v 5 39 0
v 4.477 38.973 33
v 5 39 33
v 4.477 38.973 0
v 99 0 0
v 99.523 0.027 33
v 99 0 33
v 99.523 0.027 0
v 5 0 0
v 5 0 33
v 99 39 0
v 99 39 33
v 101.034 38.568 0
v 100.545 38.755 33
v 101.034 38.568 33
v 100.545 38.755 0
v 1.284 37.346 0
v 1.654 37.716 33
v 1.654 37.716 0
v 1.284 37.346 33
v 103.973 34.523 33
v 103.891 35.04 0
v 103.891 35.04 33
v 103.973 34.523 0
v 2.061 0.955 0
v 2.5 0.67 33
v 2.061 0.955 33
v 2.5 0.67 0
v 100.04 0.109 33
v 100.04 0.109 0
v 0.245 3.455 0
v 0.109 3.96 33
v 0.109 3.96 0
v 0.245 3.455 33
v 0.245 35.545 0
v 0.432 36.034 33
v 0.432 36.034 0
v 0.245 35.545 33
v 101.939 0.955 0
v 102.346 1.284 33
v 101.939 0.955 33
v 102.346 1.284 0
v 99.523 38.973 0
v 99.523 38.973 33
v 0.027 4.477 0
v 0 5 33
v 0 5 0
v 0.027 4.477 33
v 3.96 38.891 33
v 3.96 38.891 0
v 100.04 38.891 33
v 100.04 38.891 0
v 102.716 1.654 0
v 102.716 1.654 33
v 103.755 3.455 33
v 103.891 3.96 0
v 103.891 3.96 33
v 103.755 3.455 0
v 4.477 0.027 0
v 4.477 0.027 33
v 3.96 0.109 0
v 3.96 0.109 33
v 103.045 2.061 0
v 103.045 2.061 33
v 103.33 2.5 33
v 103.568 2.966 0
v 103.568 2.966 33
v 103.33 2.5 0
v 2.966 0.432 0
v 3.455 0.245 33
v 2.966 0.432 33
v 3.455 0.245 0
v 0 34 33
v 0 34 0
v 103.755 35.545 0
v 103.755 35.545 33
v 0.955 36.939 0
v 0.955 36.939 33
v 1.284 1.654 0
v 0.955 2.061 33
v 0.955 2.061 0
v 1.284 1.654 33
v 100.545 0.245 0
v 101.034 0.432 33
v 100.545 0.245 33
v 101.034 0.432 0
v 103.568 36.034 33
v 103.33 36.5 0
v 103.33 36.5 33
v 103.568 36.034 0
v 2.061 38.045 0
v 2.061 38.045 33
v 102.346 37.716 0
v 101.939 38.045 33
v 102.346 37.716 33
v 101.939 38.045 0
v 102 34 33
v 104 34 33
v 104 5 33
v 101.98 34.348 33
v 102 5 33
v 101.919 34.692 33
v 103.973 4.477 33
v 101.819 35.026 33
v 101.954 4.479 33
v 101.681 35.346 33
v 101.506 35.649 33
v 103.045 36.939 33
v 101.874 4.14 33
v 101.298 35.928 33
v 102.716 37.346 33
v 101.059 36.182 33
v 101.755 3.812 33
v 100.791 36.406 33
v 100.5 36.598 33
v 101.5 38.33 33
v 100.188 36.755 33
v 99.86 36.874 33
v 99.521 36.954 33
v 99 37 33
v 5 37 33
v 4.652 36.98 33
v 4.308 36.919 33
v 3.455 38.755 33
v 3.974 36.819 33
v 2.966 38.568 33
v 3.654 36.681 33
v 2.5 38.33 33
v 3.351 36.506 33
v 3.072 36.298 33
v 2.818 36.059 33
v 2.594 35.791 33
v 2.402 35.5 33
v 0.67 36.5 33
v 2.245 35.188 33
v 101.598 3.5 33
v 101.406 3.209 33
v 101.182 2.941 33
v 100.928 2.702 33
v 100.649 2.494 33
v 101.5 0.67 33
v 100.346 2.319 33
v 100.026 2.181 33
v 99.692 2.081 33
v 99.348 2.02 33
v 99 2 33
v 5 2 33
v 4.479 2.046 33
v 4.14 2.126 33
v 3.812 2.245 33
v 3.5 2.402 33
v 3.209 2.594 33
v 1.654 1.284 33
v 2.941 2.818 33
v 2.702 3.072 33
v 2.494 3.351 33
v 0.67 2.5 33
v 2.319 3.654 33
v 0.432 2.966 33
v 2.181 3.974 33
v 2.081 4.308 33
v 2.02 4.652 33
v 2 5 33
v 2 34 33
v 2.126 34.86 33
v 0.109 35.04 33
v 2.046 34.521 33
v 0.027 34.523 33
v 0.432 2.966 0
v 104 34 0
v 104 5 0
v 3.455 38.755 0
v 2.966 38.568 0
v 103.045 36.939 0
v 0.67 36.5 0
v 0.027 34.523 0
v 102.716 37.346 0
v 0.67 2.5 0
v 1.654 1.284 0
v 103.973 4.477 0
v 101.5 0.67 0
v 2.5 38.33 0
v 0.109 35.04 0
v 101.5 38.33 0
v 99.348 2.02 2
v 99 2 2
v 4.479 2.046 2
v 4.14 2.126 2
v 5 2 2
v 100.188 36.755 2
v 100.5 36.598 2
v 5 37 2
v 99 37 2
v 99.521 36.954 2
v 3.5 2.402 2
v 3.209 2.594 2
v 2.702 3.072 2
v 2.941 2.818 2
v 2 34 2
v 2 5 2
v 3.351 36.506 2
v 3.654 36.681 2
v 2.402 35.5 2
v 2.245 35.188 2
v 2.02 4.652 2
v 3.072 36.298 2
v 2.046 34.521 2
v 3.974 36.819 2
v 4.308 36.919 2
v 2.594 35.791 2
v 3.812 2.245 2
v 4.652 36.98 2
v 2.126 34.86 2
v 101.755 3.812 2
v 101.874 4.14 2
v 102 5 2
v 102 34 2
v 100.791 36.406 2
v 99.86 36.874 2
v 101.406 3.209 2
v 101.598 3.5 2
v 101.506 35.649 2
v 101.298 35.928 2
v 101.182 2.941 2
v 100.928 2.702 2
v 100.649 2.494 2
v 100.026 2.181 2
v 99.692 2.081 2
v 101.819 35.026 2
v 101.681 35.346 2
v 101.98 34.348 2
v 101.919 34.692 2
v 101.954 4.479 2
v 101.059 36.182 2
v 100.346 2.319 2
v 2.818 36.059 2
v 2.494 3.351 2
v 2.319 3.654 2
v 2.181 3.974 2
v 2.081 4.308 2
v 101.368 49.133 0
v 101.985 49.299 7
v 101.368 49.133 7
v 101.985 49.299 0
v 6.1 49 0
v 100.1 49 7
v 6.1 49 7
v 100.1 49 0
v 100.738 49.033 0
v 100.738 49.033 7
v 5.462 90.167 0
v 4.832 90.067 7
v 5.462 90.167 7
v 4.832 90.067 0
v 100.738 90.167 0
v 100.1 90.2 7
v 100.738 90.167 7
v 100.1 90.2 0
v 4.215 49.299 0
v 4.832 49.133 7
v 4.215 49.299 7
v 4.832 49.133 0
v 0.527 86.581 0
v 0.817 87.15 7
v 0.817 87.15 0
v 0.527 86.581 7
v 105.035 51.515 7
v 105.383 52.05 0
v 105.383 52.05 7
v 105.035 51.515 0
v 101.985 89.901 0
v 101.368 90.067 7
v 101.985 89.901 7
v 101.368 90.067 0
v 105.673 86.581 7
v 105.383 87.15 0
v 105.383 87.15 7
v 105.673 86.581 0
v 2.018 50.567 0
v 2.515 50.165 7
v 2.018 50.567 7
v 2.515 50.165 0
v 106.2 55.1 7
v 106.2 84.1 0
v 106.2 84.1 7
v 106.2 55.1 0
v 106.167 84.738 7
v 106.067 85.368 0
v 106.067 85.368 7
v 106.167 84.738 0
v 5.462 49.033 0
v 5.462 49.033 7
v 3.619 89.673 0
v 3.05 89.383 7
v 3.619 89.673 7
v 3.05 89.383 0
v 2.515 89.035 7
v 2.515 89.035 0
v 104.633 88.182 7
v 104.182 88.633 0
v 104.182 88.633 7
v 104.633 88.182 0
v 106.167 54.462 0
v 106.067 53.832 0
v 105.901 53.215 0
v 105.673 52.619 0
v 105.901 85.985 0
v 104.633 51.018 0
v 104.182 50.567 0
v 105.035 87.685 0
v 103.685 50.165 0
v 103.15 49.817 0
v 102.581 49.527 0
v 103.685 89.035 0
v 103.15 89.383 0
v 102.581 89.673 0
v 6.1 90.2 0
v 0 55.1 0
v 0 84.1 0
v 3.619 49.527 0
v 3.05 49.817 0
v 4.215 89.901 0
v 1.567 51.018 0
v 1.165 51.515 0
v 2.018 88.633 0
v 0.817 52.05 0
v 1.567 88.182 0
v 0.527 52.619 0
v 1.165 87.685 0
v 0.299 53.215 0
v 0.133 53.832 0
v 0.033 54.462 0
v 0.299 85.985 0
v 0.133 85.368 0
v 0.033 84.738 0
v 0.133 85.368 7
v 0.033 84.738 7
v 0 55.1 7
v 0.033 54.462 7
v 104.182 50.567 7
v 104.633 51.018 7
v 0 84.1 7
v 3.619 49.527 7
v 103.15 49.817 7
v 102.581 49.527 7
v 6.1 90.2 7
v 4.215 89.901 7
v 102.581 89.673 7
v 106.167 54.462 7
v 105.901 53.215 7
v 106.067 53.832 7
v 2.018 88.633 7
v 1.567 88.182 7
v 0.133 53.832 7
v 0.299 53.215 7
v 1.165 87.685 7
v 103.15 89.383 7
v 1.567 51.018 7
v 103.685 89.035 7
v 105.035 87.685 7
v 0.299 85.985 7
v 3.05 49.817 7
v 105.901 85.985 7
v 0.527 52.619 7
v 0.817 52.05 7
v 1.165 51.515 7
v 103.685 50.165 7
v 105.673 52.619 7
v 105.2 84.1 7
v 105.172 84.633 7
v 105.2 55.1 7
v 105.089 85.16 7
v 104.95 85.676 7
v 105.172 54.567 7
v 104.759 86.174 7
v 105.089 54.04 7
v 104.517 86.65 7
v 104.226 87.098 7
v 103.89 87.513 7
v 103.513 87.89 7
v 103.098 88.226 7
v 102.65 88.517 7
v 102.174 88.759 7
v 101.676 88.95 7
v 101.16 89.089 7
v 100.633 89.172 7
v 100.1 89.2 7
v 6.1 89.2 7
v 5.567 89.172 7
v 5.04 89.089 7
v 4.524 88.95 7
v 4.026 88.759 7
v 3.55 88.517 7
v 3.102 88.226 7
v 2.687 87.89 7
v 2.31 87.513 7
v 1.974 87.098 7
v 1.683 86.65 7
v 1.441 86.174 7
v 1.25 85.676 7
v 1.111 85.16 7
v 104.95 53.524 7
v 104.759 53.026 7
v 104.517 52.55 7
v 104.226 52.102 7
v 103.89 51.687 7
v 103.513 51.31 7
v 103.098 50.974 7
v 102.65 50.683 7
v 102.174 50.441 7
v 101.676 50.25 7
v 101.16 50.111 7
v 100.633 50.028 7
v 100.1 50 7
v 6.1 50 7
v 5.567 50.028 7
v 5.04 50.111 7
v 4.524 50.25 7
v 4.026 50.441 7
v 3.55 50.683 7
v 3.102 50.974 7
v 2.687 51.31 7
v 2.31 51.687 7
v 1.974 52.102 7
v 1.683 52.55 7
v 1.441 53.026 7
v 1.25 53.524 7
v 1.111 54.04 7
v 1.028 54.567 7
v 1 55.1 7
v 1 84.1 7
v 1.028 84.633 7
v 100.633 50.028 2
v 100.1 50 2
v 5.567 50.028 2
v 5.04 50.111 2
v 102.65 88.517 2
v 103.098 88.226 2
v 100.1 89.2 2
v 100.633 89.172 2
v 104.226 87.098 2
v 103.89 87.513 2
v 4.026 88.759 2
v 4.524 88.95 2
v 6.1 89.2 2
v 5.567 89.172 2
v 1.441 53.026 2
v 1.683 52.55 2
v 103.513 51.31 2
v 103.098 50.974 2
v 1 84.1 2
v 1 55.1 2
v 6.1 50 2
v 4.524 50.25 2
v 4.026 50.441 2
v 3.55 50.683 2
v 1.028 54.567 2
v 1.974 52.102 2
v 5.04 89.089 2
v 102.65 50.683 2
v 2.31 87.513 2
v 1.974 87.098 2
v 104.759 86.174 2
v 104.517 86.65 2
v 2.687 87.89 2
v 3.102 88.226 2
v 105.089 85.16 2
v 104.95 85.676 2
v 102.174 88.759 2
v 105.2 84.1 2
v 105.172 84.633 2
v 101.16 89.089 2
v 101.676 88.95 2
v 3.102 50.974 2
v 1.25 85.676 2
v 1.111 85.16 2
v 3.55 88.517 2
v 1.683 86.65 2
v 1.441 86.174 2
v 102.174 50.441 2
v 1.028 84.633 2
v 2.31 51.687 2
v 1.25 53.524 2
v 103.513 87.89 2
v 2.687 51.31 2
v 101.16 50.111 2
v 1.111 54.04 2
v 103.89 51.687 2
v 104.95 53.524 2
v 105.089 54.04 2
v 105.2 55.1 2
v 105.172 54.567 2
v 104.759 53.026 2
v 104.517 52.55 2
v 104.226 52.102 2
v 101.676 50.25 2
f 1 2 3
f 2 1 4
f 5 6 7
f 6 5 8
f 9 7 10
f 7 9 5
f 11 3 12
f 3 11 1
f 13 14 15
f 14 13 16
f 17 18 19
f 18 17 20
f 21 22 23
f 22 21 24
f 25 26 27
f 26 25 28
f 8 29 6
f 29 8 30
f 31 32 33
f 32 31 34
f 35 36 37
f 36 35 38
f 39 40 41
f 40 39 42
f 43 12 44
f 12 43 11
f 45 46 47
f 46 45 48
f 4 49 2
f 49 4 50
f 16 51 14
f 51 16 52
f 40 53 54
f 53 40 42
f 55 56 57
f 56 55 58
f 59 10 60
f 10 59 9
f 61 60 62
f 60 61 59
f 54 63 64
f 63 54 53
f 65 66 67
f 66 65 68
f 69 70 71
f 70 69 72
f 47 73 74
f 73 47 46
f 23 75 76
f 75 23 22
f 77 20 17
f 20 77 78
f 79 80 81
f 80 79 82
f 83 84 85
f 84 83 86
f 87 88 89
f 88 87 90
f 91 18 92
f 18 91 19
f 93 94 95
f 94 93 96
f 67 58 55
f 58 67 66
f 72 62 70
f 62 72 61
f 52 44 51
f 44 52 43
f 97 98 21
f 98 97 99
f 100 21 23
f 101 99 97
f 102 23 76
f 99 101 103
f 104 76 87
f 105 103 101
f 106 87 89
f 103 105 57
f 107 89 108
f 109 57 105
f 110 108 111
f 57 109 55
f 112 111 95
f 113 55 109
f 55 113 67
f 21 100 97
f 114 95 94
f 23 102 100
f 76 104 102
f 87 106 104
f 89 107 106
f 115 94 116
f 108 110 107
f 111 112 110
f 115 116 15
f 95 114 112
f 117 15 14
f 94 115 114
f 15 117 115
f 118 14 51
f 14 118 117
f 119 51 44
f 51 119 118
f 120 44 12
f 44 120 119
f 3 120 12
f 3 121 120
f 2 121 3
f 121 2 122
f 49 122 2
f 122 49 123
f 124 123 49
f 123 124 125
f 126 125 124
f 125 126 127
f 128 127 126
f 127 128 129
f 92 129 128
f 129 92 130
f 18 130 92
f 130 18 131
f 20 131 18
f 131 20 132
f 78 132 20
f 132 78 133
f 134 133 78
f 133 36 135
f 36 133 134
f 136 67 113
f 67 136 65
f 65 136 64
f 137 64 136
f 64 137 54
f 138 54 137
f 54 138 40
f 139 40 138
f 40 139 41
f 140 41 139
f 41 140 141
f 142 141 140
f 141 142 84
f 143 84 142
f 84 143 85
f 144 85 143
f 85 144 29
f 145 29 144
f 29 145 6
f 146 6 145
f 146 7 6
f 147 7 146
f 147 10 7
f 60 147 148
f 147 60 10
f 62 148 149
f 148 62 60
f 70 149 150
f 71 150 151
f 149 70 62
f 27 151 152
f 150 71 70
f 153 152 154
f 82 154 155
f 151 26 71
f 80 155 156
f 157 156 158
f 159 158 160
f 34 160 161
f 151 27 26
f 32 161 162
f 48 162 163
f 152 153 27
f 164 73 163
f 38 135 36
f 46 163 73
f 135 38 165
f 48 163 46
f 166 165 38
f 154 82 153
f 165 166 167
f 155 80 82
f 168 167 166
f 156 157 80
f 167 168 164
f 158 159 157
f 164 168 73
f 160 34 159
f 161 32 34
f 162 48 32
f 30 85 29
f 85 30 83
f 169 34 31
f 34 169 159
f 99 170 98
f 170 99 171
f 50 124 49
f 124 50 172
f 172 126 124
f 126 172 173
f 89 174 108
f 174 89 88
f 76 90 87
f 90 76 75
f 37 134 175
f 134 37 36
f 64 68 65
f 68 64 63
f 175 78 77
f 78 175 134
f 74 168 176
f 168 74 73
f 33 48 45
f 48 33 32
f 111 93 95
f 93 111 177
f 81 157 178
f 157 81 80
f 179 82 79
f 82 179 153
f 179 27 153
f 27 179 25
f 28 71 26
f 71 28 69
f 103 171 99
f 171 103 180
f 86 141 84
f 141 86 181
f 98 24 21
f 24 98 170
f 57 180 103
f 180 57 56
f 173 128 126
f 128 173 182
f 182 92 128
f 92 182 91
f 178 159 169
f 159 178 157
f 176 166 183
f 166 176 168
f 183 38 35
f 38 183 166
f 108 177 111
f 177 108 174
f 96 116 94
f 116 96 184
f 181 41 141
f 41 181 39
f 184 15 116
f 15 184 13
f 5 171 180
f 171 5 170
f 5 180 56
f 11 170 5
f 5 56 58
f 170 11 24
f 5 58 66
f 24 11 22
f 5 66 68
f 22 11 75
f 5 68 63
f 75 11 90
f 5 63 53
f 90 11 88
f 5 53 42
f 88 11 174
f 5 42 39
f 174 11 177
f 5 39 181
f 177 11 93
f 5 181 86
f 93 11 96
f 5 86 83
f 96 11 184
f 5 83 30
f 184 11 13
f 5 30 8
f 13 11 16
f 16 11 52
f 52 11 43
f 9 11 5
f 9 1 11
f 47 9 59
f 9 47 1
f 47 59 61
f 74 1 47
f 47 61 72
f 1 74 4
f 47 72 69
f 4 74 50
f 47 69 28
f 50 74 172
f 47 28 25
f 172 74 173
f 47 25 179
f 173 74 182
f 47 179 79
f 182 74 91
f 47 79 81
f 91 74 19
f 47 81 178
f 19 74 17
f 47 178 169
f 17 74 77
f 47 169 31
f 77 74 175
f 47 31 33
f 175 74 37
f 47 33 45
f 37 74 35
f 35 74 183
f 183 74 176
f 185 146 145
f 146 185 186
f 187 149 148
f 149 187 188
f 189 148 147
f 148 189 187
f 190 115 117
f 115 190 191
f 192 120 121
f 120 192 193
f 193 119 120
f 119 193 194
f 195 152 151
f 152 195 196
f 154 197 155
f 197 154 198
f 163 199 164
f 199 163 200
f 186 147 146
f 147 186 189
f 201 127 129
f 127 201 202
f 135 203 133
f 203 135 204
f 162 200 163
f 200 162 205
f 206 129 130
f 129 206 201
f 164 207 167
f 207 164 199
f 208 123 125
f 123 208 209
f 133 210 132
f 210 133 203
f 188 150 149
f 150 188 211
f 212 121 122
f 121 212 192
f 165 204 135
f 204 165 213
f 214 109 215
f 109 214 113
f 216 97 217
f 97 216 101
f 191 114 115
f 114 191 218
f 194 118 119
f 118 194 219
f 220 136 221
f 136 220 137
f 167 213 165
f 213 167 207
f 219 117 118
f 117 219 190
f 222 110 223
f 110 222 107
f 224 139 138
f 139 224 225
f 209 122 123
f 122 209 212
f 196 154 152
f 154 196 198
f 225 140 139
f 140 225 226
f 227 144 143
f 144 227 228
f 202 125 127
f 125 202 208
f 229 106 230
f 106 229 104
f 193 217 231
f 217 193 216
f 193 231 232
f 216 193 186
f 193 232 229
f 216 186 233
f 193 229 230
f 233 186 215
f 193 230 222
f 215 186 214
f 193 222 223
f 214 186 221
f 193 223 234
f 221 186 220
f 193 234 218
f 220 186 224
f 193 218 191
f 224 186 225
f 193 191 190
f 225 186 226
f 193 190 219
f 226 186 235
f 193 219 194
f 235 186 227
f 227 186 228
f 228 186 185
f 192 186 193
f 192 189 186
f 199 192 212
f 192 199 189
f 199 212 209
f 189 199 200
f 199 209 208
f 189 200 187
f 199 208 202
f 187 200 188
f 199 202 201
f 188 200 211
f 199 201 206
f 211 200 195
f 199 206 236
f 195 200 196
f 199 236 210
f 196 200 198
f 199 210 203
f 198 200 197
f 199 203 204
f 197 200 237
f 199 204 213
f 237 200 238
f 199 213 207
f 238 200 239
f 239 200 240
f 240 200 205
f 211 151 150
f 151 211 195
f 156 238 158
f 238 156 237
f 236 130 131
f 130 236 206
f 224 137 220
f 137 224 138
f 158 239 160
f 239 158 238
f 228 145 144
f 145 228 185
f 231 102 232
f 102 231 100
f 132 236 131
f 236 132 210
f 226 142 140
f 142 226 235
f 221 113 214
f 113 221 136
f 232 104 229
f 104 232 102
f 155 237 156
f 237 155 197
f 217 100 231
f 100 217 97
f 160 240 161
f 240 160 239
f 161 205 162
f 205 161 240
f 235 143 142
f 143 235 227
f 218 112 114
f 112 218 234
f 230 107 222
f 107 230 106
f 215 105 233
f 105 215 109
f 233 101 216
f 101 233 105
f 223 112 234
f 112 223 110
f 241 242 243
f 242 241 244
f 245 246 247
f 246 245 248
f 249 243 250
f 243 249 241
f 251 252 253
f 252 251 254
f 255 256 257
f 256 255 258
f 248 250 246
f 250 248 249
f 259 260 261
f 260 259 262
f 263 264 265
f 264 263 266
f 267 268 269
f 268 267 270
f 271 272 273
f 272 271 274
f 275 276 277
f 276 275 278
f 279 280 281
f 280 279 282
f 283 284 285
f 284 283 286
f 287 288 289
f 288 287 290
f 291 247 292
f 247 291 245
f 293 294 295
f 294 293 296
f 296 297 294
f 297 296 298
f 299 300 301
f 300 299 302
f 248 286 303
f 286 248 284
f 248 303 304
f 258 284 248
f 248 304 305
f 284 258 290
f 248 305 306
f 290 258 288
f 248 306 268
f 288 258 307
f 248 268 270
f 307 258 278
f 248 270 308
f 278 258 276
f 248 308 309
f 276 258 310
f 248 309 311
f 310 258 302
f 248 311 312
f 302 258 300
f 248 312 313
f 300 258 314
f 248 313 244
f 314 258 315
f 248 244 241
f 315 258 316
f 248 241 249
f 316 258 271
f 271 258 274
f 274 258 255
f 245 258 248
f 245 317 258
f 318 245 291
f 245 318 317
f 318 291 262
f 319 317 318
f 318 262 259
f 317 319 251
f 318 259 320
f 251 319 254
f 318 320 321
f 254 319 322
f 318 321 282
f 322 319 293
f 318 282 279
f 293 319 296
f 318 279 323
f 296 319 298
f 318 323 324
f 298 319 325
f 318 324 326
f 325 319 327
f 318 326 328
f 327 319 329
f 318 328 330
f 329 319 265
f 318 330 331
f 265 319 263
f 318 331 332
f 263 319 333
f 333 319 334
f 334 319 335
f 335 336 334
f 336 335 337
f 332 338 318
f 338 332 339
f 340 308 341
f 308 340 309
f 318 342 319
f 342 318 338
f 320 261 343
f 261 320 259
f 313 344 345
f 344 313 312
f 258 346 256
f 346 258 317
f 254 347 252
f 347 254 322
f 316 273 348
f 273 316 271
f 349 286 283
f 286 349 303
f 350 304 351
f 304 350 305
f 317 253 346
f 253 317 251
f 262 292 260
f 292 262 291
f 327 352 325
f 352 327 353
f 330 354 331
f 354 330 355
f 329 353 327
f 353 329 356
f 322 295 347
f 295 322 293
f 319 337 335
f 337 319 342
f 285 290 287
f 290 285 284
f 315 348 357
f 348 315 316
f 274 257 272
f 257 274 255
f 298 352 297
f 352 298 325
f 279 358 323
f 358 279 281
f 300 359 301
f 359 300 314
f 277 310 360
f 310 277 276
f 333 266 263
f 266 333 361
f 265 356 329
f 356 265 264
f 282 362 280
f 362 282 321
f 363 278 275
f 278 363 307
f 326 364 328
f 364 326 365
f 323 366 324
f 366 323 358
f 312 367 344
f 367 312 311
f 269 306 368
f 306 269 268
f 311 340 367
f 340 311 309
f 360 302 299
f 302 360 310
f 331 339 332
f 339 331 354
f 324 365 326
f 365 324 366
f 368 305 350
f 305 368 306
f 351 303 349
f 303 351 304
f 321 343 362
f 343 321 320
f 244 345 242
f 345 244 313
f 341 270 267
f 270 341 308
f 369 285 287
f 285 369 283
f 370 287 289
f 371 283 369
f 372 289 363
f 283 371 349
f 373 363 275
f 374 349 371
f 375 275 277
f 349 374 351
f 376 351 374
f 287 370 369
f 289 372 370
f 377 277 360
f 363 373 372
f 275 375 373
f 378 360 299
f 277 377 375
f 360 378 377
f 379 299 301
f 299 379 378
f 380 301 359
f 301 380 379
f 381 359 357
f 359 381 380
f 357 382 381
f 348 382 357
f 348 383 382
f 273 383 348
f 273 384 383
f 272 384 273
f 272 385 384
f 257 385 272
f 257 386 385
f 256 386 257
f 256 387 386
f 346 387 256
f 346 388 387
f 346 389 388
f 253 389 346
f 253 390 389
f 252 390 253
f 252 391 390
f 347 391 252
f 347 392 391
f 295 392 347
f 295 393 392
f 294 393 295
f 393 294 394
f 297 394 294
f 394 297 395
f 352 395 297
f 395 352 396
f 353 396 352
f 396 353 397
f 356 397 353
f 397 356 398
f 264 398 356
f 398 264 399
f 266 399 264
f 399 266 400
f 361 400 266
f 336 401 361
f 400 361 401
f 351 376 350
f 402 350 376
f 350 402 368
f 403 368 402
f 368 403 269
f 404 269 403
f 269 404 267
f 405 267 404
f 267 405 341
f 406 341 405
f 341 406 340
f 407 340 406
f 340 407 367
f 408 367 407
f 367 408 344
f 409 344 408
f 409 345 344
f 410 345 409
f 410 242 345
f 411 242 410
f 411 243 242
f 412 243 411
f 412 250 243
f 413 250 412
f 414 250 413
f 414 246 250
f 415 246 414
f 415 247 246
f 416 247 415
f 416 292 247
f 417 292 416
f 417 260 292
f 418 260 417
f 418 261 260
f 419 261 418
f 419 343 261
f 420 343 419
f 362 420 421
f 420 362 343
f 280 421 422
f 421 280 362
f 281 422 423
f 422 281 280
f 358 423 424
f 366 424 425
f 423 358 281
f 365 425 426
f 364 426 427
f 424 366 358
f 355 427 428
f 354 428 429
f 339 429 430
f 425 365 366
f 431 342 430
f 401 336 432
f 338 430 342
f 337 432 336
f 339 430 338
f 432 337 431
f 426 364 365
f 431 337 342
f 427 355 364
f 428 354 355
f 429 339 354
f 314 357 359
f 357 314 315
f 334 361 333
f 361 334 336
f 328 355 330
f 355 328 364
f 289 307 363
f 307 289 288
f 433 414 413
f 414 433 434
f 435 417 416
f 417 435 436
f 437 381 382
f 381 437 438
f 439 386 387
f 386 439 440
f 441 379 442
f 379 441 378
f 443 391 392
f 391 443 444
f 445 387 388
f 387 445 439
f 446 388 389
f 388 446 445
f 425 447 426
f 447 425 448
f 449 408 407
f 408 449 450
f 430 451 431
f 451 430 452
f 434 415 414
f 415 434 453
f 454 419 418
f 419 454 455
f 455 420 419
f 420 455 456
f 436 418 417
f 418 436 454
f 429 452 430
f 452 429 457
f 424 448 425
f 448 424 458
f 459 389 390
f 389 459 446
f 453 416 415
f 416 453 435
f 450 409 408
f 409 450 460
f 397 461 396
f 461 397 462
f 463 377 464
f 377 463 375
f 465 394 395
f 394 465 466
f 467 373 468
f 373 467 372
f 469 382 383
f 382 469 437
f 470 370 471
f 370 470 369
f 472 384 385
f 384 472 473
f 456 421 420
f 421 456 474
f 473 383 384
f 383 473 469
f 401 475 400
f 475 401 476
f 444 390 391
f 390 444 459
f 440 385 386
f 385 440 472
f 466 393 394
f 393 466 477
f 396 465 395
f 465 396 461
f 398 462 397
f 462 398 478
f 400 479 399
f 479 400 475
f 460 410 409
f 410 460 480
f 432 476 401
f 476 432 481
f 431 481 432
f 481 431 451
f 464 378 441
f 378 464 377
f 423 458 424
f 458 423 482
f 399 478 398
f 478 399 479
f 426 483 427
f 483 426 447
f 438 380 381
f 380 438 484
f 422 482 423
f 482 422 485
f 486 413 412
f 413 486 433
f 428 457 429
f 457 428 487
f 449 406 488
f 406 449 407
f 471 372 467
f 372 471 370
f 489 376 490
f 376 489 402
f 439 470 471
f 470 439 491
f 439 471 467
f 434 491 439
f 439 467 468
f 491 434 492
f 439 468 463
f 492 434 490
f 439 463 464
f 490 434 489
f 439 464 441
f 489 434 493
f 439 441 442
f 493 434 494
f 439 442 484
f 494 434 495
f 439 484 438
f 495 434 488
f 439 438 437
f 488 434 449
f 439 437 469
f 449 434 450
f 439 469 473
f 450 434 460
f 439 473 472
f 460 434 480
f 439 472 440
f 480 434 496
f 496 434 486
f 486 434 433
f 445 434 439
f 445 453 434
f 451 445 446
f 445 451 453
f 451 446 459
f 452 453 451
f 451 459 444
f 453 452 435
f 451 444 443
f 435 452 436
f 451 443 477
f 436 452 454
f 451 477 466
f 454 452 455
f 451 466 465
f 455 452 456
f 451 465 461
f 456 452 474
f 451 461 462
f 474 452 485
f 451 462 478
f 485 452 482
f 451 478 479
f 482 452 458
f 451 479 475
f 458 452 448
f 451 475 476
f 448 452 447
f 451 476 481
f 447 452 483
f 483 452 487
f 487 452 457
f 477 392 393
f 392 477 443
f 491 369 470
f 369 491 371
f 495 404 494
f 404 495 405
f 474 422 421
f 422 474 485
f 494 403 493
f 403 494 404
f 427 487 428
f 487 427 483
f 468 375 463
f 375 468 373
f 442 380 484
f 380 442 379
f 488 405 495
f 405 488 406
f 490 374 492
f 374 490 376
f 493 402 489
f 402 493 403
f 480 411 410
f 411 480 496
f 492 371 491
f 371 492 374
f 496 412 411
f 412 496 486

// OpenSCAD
// =============================================
// 3D: Mic Transceiver Box — inner 100x35x17, base + cap
// Version: 1.1
// Author: ChatGPT (OpenSCAD)
// =============================================

// Short description for models table
description = "";
version_str = "1.1";

// ----------------------------
// Параметры модели (мм)
// ----------------------------
inner_x = 100;               // внутренняя длина (X)
inner_y = 35;                // внутренняя ширина (Y)
inner_h = 31;                // внутренняя высота (Z)

wall_th    = 2;            // толщина стенок основания
bottom_th  = 2;            // толщина дна основания
corner_r   = 3.0;            // радиус скругления внутренних углов

// Крышка (накладная)
fit_clearance = 0.1;        // зазор на посадку (каждая сторона по радиусу/по XY)
cap_wall_th   = 1;         // толщина стенок крышки
cap_top_th    = 2;         // толщина верха крышки
cap_lip_h     = 5.0;        // глубина посадочного борта крышки (внутрь)

// Выбор вывода
print_base = true;
print_cap  = true;

// Shared library
use <../modules.scad>

// ----------------------------
// Настройка точности
// ----------------------------
$fn = 0;        // фиксированную сегментацию отключаем
$fa = 6;        // 5–8° обычно достаточно
$fs = 0.35;     // ≈ диаметр сопла (0.3–0.5 для сопла 0.4)
pin_fs = 0.25;  // чуть тоньше для штырей и отверстий

// ----------------------------
// Вычисляемые размеры
// ----------------------------
base_outer_x = inner_x + 2*wall_th;
base_outer_y = inner_y + 2*wall_th;
base_outer_h = bottom_th + inner_h;

base_inner_r = max(corner_r, 0);
base_outer_r = base_inner_r + wall_th;

cap_inner_x = base_outer_x + 2*fit_clearance;
cap_inner_y = base_outer_y + 2*fit_clearance;
cap_inner_r = base_outer_r + fit_clearance;  // радиус по внутреннему борту крышки

cap_outer_x = cap_inner_x + 2*cap_wall_th;
cap_outer_y = cap_inner_y + 2*cap_wall_th;
cap_outer_h = cap_top_th + cap_lip_h;
cap_outer_r = cap_inner_r + cap_wall_th;

// ----------------------------
// Комментарии / фрагменты
// ----------------------------
// Фрагменты:
// - base: основание — лоток с закругленными углами и плоским дном
// - cap: крышка — закрытый верх + борт нужной глубины, посадка по fit_clearance
// ----------------------------
// Фрагменты детали
// ----------------------------
module base_body(){
    difference(){
        // внешний корпус основания с фаской снизу
        rounded_prism([base_outer_x, base_outer_y], base_outer_h, base_outer_r);
        // внутренняя полость
        translate([wall_th,wall_th,bottom_th])
            rounded_prism([inner_x, inner_y], inner_h, base_inner_r);
    }
}

module cap_shell(){
    difference(){
        // внешний объём крышки (без фаски сверху; опционально фаску снизу)
        rounded_prism([cap_outer_x, cap_outer_y], cap_outer_h, cap_outer_r);
        // внутренняя полость на глубину борта
        translate([cap_wall_th, cap_wall_th, cap_top_th])
            rounded_prism([cap_inner_x, cap_inner_y], cap_lip_h, cap_inner_r);
    }
}

// Главные детали
module base(){ base_body(); }
module cap(){ cap_shell(); }
module all_parts(){
    if (print_base) base();
    if (print_cap) {
        translate([0, base_outer_y + 10, 0]) cap();
    }
}
// ----------------------------
// ВЫВОД МОДЕЛИ
// ----------------------------
clip_for_fragments(){ all_parts(); }
